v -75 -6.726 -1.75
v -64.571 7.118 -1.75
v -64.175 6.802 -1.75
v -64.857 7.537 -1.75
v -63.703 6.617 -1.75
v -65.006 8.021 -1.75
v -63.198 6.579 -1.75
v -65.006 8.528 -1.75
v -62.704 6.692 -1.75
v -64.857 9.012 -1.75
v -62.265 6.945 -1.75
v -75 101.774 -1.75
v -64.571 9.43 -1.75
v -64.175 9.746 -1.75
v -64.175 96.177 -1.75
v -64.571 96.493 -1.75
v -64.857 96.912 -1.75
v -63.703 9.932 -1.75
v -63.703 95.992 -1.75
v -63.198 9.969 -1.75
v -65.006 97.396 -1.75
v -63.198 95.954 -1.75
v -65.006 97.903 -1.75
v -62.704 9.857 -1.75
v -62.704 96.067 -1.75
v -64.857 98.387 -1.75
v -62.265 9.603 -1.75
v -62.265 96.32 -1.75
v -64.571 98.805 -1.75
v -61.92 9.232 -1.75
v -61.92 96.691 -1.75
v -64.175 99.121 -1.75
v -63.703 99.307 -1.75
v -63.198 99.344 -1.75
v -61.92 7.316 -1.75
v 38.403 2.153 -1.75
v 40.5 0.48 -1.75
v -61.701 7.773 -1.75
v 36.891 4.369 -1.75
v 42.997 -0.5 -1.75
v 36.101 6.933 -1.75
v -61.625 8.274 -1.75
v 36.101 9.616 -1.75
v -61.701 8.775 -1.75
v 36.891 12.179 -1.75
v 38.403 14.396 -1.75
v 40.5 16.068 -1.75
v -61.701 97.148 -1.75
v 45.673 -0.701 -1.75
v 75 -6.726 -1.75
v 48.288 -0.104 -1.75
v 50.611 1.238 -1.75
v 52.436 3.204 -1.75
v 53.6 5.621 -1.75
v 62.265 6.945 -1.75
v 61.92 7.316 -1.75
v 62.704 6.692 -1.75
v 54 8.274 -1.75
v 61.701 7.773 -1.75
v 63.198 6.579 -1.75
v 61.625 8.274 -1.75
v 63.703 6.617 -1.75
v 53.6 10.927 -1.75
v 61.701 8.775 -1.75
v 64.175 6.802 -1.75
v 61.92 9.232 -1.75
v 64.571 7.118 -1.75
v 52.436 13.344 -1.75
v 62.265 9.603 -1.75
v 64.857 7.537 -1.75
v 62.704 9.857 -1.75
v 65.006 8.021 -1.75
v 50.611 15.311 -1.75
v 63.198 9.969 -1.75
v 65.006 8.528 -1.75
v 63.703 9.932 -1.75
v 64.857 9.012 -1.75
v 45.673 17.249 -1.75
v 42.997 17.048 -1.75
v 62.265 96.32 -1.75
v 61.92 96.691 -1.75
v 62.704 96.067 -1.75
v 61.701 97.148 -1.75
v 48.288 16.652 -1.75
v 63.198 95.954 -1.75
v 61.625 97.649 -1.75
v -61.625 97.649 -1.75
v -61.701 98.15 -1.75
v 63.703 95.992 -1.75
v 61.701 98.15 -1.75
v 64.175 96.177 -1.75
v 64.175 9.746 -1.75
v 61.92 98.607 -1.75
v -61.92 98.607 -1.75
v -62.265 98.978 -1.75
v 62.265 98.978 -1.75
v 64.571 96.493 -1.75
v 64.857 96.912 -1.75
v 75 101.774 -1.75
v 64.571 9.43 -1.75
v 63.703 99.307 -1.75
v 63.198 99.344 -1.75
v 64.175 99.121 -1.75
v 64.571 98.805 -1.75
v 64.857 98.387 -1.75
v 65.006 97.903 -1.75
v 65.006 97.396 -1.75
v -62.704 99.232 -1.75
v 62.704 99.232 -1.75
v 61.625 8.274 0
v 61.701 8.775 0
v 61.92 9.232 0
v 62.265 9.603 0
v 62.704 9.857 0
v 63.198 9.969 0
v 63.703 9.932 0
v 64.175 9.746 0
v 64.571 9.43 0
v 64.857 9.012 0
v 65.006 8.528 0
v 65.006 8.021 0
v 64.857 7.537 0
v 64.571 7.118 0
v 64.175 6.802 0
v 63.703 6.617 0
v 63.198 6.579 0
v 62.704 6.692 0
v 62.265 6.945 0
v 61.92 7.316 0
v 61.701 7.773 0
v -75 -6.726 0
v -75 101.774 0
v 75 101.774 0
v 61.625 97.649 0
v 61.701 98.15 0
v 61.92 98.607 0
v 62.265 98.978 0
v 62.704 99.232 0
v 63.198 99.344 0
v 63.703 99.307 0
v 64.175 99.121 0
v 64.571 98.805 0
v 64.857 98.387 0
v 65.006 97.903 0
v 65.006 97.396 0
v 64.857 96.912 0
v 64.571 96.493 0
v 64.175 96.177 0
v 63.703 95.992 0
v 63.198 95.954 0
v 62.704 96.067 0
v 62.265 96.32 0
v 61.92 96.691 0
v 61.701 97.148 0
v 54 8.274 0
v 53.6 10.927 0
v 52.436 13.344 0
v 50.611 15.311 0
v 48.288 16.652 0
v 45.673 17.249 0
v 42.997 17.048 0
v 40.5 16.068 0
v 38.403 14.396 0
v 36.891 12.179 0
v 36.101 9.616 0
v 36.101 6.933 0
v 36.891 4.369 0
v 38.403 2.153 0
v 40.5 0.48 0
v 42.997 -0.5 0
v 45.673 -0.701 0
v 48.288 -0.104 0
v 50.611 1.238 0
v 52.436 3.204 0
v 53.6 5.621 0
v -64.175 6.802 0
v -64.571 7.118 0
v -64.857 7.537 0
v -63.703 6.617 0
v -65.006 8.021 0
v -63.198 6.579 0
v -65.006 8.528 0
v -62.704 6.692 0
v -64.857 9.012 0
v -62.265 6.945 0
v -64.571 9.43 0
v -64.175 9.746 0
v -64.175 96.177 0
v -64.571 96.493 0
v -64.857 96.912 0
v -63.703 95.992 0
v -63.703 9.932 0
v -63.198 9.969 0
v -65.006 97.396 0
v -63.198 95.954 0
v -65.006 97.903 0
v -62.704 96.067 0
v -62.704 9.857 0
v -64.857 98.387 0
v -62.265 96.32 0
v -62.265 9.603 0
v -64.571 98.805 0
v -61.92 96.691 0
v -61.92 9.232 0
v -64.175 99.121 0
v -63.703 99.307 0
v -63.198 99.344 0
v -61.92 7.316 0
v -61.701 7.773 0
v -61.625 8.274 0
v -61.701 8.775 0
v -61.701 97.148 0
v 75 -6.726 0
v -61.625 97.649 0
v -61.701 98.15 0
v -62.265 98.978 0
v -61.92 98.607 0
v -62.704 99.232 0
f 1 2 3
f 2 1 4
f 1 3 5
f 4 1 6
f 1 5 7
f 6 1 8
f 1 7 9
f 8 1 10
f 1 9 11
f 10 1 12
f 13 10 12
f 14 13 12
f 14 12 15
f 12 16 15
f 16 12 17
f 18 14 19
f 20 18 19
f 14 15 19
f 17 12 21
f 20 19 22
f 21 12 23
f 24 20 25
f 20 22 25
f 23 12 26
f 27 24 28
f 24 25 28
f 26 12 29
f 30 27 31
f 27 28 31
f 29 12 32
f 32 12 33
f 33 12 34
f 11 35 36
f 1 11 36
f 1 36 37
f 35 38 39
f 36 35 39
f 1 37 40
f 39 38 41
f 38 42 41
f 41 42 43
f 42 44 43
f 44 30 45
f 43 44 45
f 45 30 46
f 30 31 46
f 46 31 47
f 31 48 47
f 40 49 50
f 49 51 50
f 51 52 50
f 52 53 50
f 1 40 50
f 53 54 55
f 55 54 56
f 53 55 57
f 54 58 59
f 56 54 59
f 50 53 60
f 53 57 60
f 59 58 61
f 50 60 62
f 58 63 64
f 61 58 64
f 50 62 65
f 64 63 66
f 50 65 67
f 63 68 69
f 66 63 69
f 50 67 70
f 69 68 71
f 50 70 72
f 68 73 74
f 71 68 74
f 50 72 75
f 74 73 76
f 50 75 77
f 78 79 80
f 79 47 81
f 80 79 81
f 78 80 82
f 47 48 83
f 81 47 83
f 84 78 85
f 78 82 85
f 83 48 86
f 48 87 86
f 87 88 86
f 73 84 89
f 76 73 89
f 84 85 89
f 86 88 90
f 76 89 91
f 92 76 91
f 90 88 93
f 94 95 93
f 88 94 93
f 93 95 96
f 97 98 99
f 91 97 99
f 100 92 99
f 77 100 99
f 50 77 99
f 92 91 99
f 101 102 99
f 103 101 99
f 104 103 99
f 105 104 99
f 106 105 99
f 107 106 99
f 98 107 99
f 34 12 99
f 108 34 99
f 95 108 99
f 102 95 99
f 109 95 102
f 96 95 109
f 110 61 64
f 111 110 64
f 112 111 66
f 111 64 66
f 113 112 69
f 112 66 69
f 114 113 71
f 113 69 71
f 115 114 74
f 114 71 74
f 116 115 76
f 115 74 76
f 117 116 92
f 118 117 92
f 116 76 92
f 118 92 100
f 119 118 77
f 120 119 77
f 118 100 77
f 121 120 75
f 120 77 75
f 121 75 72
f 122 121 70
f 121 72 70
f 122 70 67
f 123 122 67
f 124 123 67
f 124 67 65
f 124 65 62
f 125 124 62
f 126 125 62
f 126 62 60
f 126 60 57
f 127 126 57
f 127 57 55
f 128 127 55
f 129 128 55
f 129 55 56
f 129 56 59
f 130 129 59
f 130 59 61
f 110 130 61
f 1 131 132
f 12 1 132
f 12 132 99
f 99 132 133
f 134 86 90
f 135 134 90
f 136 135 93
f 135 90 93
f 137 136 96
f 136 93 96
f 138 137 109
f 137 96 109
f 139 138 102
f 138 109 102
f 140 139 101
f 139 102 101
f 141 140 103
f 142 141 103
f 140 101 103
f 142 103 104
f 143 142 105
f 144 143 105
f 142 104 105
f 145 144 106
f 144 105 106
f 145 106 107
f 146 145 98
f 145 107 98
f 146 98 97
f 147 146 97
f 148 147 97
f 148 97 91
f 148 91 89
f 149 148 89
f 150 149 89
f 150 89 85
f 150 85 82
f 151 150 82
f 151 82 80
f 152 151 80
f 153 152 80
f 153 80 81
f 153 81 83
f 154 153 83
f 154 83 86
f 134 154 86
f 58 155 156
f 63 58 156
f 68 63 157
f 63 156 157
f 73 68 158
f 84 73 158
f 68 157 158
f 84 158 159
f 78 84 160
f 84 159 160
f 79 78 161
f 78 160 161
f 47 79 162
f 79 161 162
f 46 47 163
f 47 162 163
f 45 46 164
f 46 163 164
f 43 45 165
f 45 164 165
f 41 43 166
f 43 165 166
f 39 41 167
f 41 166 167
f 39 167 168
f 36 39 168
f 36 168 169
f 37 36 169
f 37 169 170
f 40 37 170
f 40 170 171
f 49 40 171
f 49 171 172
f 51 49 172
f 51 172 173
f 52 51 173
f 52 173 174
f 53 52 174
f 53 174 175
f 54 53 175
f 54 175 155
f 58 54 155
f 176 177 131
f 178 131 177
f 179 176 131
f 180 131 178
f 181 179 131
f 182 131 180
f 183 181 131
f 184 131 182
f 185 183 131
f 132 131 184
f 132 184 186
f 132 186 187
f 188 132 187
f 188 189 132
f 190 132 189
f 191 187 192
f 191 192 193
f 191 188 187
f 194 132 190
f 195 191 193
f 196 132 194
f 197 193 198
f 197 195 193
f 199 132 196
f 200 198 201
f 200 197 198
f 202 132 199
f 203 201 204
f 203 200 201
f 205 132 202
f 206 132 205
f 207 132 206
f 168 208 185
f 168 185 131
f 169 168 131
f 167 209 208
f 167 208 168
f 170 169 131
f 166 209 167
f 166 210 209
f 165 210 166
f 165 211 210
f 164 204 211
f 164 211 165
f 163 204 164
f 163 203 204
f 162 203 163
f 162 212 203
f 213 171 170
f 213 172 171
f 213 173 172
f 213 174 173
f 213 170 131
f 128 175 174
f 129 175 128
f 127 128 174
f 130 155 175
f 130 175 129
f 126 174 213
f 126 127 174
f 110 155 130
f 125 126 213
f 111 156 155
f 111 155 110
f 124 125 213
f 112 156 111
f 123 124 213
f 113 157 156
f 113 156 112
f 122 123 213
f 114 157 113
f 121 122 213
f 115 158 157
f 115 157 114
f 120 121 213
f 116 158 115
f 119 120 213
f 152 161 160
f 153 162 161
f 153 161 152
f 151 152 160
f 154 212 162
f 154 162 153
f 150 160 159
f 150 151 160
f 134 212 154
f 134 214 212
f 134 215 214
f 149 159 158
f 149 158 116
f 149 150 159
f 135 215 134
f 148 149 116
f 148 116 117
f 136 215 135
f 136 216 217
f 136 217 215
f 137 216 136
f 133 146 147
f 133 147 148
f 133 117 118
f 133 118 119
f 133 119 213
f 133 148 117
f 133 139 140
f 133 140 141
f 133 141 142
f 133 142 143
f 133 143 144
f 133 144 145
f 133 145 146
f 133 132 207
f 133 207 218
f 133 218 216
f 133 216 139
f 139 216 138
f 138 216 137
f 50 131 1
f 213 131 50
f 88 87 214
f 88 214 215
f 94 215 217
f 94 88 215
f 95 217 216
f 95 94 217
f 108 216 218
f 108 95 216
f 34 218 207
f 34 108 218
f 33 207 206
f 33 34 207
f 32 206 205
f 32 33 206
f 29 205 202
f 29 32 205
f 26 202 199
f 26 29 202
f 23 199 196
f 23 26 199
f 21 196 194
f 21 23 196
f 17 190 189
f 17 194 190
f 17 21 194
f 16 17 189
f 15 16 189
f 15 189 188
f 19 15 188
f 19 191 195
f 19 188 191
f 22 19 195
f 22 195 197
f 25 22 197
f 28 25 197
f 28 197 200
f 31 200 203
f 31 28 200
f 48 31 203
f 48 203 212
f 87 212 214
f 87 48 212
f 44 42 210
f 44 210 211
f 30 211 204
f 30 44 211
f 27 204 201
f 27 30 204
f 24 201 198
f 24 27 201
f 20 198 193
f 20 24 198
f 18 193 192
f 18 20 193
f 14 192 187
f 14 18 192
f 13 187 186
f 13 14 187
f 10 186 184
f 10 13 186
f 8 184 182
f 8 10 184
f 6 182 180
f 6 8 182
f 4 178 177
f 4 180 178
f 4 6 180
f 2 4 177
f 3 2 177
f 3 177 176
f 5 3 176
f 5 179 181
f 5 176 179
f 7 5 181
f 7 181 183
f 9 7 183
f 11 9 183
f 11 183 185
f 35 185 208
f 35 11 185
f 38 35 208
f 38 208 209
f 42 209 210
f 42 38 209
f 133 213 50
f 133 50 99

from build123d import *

# Parameters (mm, degrees)
SKETCH1_W            = 150
SKETCH1_H            = 108.5
BASE_FLANGE1_DEPTH   = 1.75
CUT_EXTRUDE1_REACH   = 128.436
SKETCH6_R            = 9
M3_CLEARANCE_HOLE1_D = 3.4


# Sheet-metal steps are written as plain solids
with BuildPart() as part:
    # Sketch1 → Base-Flange1 (new body)
    with BuildSketch(Plane.XY):
        with Locations((0, 47.52414015)):
            Rectangle(SKETCH1_W, SKETCH1_H)
    extrude(amount=-BASE_FLANGE1_DEPTH)

    # Sketch6 → Cut-Extrude1 (cut, up to next)
    with BuildSketch(Plane.XY, mode=Mode.PRIVATE) as cut_extrude1_sk1:
        with Locations((45, 8.27414015)):
            Circle(SKETCH6_R)
    cut_extrude1_tool1 = extrude(cut_extrude1_sk1.sketch, amount=-CUT_EXTRUDE1_REACH, mode=Mode.PRIVATE) & part.part
    add(cut_extrude1_tool1.solids().sort_by_distance((45, 8.27414, 0))[0], mode=Mode.SUBTRACT)

    # M3 Clearance Hole1 (through all)
    with Locations(Plane.XY):
        with Locations((63.325, 8.27414015), (63.325, 97.64914015)):
            m3_clearance_hole1 = Hole(M3_CLEARANCE_HOLE1_D / 2)

    # Mirror1: M3 Clearance Hole1 across plane
    add(m3_clearance_hole1.mirror(Plane(origin=(0, 0, 0), x_dir=(0, 0, 1), z_dir=(1, 0, 0))), mode=Mode.SUBTRACT)


solid = part.part
